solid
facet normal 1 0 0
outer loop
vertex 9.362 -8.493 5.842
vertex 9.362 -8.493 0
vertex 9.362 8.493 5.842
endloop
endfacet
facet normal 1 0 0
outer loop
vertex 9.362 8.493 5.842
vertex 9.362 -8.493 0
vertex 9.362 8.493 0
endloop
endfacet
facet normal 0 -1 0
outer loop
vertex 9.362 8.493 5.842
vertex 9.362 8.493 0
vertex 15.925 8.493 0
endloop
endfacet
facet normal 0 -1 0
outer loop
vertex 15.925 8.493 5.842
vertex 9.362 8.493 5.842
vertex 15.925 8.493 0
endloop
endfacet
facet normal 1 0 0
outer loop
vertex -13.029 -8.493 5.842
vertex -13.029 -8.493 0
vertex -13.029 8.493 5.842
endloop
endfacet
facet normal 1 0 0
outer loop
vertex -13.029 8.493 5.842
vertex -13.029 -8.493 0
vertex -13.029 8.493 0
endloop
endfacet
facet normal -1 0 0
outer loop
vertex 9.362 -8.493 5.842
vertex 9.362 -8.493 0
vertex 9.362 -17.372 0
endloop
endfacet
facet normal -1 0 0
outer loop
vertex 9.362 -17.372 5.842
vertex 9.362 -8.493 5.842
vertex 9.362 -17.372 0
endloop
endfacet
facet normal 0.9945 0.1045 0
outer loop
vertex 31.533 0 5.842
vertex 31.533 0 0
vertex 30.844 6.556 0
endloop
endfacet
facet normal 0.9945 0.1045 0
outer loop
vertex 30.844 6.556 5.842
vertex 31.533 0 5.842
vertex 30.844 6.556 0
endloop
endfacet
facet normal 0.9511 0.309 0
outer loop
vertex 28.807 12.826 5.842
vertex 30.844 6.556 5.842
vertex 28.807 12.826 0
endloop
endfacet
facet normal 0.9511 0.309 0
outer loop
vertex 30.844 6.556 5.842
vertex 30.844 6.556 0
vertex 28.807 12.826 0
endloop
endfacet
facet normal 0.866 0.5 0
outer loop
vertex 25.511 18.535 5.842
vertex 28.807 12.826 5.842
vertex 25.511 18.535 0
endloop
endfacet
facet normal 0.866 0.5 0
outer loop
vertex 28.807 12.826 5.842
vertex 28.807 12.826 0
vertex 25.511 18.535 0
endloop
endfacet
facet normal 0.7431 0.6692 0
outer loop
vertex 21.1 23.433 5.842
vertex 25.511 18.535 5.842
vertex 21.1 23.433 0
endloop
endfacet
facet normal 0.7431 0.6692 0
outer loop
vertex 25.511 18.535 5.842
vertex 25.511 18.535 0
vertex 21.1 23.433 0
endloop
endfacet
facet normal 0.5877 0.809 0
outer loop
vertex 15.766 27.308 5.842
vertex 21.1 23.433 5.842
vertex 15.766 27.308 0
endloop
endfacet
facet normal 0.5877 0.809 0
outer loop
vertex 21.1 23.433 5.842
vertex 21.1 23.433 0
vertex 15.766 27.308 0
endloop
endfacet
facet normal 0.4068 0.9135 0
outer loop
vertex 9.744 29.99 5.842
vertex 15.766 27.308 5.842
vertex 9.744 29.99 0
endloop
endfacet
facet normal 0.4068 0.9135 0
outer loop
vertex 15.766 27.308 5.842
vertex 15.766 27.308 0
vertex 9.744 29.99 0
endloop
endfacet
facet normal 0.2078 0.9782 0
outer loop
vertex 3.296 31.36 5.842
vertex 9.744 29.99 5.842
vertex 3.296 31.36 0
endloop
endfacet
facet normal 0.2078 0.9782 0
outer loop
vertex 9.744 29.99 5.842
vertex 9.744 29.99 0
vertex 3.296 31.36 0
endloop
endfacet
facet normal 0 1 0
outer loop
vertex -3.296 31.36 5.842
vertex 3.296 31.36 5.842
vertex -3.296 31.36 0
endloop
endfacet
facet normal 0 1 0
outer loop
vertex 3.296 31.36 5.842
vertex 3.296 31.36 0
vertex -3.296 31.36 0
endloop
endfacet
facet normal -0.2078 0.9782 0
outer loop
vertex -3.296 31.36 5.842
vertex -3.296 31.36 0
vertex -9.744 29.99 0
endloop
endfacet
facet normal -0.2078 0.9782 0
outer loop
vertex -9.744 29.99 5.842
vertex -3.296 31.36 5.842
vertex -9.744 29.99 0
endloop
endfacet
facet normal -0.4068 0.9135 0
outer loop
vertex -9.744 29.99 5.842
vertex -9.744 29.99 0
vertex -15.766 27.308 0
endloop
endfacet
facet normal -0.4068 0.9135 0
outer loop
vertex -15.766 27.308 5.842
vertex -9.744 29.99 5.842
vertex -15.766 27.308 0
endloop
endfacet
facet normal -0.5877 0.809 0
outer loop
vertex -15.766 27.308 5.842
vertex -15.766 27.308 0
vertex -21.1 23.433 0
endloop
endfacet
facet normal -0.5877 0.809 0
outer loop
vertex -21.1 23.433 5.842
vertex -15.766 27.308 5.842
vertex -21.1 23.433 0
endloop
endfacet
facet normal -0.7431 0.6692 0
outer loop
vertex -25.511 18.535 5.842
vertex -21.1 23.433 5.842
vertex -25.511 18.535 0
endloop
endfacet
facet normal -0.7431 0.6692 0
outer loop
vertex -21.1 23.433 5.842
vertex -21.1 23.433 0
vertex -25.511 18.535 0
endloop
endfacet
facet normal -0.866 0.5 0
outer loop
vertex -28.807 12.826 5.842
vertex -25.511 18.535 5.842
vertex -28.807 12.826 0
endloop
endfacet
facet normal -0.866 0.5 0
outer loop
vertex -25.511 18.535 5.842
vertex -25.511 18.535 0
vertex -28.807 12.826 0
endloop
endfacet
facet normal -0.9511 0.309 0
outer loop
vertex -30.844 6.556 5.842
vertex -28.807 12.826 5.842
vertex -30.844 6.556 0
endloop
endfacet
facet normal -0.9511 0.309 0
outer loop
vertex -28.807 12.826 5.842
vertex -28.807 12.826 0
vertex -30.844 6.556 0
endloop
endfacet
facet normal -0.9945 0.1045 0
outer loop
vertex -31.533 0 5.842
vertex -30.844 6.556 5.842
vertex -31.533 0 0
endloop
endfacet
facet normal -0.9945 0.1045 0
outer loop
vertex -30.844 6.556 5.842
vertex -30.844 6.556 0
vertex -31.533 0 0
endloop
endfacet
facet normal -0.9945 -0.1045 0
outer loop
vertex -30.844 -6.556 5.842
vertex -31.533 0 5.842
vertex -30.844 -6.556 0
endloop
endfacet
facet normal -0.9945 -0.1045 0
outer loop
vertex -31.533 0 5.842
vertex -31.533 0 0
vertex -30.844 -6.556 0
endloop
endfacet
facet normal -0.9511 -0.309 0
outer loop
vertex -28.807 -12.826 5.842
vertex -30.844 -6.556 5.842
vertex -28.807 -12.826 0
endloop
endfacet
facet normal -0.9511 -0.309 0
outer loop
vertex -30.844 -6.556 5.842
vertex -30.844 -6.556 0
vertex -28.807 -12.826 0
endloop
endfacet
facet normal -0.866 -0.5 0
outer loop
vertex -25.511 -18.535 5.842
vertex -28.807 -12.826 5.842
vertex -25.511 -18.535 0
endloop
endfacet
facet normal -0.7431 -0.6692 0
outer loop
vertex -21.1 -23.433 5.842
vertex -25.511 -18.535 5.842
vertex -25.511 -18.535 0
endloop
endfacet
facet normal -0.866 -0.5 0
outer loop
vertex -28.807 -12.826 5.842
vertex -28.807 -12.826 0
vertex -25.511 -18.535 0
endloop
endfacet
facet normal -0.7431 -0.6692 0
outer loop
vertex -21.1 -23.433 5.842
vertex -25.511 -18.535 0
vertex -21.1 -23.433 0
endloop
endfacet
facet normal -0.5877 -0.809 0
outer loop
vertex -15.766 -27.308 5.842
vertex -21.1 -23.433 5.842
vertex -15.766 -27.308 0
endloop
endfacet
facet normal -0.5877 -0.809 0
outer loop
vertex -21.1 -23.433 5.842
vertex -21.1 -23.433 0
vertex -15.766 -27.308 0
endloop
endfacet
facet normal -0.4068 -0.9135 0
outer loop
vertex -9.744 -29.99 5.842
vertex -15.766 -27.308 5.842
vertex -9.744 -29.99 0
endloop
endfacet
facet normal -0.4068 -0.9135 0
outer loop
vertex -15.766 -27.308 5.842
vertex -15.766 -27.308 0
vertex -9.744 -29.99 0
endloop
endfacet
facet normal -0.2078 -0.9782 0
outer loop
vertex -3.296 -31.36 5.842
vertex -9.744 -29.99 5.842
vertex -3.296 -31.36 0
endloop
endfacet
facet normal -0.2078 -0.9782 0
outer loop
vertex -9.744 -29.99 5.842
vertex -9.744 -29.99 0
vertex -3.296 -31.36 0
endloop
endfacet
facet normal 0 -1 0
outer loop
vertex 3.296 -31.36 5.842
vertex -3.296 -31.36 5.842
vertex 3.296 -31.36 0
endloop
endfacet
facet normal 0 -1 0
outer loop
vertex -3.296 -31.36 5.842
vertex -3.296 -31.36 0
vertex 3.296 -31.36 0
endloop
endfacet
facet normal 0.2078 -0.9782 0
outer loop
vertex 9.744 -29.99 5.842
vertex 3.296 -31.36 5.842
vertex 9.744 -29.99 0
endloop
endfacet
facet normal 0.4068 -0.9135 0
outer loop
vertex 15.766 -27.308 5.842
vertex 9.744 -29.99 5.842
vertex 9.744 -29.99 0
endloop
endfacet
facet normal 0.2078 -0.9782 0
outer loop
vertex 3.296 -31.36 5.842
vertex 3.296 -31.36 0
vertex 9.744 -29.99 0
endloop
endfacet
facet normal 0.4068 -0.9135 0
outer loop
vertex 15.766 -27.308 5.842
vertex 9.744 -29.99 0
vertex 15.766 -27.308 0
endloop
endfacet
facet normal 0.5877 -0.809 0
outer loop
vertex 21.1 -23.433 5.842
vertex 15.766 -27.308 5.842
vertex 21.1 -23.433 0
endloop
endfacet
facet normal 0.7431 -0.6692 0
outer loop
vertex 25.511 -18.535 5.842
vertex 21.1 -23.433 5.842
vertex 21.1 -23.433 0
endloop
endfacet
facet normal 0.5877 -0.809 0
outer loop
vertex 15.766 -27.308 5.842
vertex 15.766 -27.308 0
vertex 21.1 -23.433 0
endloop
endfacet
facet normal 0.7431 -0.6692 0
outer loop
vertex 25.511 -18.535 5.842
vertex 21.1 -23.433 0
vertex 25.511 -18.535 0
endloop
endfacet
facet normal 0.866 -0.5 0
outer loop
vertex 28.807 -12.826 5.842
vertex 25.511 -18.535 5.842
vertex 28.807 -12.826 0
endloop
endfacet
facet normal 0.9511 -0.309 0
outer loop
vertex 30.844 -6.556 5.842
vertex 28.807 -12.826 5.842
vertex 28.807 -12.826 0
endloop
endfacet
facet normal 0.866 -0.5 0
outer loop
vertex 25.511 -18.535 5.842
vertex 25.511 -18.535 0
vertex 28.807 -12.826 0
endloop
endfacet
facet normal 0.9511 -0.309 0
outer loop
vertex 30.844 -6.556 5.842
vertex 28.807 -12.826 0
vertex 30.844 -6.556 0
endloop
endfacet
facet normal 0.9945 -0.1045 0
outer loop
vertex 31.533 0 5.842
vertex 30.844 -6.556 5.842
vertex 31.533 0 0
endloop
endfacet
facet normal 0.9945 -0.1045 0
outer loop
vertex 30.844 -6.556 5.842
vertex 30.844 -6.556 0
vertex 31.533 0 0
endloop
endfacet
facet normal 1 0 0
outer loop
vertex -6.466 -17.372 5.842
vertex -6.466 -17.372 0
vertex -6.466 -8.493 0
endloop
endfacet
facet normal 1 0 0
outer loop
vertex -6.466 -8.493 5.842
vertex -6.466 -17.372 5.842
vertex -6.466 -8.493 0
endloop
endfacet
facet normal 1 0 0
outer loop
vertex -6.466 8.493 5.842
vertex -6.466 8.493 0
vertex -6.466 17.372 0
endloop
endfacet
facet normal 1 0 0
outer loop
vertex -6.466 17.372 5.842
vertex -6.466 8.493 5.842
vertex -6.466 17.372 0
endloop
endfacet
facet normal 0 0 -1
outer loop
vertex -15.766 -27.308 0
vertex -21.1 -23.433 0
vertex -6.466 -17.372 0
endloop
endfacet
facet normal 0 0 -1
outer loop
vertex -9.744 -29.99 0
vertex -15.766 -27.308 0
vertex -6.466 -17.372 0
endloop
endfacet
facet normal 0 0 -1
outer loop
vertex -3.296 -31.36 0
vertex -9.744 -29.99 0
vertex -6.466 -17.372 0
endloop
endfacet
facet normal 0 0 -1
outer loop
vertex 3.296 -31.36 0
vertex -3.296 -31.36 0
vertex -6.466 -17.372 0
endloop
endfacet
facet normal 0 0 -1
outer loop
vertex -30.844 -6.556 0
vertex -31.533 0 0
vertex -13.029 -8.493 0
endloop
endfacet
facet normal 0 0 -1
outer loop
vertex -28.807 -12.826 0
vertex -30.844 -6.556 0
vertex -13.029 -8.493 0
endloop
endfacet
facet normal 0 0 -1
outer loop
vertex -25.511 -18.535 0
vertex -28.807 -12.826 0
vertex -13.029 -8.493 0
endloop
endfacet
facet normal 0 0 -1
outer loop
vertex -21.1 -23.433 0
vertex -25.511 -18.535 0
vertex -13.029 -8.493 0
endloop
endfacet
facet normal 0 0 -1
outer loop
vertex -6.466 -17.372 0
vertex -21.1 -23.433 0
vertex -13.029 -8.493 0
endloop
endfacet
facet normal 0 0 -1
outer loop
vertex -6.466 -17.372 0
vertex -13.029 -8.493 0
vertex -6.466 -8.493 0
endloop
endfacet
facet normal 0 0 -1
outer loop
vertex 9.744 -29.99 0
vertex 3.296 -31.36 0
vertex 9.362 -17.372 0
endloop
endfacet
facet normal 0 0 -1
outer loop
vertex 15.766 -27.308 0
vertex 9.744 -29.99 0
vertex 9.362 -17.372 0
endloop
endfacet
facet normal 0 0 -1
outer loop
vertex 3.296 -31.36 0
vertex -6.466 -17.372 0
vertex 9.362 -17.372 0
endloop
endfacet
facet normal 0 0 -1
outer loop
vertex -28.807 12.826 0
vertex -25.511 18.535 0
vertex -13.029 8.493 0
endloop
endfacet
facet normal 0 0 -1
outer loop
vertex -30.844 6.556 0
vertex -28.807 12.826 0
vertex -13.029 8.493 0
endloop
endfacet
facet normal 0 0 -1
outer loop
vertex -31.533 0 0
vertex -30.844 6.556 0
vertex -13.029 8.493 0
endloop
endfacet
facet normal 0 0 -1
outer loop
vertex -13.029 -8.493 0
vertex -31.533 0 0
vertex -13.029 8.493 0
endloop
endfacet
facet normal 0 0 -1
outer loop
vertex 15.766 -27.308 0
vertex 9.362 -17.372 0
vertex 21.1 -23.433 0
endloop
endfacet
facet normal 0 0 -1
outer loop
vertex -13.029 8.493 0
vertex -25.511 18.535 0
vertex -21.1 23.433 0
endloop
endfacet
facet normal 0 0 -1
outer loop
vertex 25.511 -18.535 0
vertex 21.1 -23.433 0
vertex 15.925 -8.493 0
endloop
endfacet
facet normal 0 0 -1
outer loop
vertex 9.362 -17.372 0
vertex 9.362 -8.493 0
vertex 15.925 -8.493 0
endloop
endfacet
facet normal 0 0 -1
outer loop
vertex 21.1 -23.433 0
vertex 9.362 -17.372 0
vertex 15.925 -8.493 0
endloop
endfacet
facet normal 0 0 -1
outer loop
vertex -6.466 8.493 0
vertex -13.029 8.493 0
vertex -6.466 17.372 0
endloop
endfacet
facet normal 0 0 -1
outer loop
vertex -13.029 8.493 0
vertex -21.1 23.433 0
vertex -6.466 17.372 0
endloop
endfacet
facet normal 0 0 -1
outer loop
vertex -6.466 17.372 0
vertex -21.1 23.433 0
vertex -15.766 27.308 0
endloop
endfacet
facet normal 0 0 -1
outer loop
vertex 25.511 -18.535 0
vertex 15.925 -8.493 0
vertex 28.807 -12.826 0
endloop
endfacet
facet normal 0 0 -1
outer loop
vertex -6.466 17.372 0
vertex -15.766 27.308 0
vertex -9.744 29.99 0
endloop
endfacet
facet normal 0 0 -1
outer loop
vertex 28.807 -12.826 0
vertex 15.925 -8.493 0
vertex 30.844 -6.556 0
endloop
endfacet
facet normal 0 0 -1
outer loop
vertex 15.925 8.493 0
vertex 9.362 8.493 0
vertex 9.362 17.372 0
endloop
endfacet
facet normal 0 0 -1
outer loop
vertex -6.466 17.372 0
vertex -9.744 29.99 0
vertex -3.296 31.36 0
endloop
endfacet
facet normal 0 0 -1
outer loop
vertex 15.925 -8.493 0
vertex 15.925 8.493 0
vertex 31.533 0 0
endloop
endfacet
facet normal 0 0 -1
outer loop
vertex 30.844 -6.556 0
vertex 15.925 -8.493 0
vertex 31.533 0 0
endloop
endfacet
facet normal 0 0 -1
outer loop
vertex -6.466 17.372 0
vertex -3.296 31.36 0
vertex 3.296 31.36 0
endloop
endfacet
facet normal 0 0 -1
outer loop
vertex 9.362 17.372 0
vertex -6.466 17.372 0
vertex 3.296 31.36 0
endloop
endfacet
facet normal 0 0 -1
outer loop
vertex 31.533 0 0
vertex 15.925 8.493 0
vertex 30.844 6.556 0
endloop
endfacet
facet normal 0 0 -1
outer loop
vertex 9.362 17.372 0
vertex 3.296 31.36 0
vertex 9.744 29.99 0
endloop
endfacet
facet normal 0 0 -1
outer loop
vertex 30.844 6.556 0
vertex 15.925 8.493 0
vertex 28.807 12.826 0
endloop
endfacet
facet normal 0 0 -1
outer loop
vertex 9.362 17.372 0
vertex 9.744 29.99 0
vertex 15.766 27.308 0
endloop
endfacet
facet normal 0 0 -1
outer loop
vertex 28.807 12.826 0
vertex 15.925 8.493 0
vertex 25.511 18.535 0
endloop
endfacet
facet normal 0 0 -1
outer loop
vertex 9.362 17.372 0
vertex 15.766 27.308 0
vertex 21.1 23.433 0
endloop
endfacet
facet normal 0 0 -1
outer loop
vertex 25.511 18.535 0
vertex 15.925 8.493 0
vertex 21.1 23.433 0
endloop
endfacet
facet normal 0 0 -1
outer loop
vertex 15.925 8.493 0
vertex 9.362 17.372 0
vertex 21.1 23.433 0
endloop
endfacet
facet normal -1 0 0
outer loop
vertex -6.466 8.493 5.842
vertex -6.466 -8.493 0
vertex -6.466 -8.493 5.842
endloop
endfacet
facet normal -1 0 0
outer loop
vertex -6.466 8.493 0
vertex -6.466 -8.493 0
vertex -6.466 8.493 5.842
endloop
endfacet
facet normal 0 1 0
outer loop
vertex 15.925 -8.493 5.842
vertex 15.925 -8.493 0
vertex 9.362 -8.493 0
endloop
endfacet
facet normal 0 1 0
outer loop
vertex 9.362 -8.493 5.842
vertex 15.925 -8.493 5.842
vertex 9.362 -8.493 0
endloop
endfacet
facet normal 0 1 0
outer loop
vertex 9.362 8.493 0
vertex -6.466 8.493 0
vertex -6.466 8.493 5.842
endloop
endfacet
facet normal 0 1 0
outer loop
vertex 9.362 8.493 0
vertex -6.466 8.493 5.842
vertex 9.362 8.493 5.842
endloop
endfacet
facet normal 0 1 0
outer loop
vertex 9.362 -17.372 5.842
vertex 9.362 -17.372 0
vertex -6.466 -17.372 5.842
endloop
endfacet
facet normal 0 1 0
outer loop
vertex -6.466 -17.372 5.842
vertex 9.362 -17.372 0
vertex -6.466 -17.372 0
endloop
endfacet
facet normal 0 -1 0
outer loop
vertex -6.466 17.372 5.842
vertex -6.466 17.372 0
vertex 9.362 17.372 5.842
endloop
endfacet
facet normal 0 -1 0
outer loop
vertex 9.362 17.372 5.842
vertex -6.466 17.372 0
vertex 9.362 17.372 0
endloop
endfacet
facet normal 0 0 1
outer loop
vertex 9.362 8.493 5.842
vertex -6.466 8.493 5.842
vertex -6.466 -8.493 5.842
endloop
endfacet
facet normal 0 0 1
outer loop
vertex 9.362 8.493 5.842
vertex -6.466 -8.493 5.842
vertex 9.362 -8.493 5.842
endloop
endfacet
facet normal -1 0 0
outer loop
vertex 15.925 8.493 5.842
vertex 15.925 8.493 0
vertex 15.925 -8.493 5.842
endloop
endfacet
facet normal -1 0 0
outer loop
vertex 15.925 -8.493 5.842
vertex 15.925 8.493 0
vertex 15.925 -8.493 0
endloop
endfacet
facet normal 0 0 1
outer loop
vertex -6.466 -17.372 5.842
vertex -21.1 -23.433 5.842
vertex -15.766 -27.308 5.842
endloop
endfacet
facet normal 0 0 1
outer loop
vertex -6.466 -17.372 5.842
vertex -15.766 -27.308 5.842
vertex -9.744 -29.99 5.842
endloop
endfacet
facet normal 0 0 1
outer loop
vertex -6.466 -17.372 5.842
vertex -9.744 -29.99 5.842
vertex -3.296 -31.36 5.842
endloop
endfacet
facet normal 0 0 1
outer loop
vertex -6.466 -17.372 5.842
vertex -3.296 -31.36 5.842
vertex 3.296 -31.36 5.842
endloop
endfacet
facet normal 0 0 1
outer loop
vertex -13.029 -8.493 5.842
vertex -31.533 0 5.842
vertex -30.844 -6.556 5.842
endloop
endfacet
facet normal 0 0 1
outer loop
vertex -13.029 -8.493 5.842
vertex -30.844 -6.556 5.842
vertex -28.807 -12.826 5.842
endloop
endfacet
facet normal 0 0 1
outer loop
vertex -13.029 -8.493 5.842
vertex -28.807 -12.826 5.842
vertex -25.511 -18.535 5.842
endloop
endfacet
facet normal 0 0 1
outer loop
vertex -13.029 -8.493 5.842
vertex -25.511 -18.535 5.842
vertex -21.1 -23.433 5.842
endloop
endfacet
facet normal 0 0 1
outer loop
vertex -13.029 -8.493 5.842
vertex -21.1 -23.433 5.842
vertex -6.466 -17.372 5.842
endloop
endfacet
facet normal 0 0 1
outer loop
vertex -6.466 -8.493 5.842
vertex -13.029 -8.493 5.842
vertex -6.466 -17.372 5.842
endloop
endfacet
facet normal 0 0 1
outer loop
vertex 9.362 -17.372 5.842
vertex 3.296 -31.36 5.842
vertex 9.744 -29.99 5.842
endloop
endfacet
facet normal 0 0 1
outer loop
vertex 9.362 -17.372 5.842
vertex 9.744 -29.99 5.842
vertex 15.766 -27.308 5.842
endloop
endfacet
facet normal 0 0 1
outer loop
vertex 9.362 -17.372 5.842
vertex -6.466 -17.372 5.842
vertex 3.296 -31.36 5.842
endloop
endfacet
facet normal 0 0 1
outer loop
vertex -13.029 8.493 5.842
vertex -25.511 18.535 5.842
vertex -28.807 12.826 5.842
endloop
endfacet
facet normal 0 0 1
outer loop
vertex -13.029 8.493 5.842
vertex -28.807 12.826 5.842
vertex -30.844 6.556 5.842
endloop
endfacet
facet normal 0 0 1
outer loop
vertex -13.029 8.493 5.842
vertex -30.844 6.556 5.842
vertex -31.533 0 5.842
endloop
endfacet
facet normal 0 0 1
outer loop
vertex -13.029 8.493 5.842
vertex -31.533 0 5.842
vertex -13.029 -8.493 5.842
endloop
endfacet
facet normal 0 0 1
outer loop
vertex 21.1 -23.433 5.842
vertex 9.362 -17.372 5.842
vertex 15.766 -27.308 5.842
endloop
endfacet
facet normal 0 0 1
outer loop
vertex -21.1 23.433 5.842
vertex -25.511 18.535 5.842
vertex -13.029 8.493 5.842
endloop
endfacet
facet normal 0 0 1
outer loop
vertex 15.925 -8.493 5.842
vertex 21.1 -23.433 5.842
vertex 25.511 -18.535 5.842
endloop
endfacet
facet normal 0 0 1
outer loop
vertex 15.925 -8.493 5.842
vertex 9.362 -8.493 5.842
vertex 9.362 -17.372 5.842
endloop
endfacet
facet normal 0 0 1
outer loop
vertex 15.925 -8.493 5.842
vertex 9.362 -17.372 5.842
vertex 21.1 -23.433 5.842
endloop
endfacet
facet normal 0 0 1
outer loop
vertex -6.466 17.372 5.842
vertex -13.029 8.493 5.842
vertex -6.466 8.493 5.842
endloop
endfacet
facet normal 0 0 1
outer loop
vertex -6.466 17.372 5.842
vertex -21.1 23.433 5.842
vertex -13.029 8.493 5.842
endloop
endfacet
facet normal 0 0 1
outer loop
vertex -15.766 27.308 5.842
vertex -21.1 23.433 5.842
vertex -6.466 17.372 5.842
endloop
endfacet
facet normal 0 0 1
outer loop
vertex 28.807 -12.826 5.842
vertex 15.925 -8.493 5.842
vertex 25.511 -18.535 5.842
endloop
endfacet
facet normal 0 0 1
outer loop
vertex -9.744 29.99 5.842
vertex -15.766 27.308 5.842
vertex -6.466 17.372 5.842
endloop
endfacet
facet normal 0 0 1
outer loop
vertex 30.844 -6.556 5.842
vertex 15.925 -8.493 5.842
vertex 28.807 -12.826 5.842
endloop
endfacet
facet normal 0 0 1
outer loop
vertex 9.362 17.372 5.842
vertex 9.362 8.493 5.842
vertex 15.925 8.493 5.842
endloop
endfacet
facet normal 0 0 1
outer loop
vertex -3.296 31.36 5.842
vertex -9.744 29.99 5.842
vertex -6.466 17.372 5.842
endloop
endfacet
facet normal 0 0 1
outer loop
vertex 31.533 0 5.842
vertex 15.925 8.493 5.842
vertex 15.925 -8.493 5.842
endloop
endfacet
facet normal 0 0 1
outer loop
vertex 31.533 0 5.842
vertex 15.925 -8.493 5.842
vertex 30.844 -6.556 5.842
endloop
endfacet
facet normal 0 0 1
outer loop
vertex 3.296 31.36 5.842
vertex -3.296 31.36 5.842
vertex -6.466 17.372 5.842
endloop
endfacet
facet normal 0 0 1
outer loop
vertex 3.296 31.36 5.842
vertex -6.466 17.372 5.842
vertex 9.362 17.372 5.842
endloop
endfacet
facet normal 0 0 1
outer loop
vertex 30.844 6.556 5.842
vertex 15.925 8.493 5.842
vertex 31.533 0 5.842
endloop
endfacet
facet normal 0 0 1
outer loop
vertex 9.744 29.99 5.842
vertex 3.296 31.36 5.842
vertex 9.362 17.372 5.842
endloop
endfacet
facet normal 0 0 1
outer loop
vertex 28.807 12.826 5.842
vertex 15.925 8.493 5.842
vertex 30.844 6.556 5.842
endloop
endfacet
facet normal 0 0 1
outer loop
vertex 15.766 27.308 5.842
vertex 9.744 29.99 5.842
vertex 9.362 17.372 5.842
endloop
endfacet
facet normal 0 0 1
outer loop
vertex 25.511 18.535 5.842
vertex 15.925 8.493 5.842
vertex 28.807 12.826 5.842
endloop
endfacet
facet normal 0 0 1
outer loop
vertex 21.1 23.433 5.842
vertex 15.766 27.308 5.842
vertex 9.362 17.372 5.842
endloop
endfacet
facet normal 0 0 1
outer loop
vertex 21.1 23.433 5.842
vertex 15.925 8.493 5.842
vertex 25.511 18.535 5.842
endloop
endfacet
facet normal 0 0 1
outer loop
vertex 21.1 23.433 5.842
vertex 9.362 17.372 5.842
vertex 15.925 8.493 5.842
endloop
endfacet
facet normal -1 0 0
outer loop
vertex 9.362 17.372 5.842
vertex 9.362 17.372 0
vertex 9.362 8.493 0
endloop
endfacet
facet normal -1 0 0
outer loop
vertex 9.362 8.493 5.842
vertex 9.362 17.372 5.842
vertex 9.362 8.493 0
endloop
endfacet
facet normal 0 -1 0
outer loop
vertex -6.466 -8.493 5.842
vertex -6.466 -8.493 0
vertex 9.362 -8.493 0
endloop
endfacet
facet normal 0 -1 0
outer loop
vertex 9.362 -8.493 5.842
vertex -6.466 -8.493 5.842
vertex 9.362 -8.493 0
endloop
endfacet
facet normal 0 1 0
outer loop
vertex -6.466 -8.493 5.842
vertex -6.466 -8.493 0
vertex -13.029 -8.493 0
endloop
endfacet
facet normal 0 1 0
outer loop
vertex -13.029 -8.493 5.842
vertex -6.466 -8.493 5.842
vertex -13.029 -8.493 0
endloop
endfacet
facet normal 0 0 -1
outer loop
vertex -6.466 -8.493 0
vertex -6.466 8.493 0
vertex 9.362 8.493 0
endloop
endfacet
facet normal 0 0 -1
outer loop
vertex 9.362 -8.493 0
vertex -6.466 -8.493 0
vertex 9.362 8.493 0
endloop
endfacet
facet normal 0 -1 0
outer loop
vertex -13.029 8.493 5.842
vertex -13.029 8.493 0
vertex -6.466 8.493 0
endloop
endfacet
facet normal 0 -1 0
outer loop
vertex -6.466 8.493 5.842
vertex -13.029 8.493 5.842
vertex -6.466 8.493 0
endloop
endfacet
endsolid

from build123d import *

# Parameters (mm, degrees)
F0_W     = 15.8282737248
F0_H     = 16.9864408672
F1_DEPTH = 5.842
F0_R     = 31.5328718462


# Not quite as in the source:
# - a feature of the source that left no trace in its solid (it failed there, or was rolled back) is left out


with BuildPart() as f1:
    # F0 (on Top) → F1 (new body)
    with BuildSketch(Plane.XY):
        with Locations((1.4477076475, 0)):
            Rectangle(F0_W, F0_H)
    extrude(amount=F1_DEPTH)


with BuildPart() as f1b:
    # F0 (on Top) → F1, piece 2 (new body)
    with BuildSketch(Plane.XY):
        Circle(F0_R)
        Polygon((9.3618445098, 8.4932204336), (15.9247908741, 8.4932204336), (15.9247908741, -8.4932204336), (9.3618445098, -8.4932204336), (9.3618445098, -17.3724964261), (-6.4664292149, -17.3724964261), (-6.4664292149, -8.4932204336), (-13.0293755792, -8.4932204336), (-13.0293755792, 8.4932204336), (-6.4664292149, 8.4932204336), (-6.4664292149, 17.3724964261), (9.3618445098, 17.3724964261), align=None, mode=Mode.SUBTRACT)
    extrude(amount=F1_DEPTH)


solid = Compound([f1.part, f1b.part])
